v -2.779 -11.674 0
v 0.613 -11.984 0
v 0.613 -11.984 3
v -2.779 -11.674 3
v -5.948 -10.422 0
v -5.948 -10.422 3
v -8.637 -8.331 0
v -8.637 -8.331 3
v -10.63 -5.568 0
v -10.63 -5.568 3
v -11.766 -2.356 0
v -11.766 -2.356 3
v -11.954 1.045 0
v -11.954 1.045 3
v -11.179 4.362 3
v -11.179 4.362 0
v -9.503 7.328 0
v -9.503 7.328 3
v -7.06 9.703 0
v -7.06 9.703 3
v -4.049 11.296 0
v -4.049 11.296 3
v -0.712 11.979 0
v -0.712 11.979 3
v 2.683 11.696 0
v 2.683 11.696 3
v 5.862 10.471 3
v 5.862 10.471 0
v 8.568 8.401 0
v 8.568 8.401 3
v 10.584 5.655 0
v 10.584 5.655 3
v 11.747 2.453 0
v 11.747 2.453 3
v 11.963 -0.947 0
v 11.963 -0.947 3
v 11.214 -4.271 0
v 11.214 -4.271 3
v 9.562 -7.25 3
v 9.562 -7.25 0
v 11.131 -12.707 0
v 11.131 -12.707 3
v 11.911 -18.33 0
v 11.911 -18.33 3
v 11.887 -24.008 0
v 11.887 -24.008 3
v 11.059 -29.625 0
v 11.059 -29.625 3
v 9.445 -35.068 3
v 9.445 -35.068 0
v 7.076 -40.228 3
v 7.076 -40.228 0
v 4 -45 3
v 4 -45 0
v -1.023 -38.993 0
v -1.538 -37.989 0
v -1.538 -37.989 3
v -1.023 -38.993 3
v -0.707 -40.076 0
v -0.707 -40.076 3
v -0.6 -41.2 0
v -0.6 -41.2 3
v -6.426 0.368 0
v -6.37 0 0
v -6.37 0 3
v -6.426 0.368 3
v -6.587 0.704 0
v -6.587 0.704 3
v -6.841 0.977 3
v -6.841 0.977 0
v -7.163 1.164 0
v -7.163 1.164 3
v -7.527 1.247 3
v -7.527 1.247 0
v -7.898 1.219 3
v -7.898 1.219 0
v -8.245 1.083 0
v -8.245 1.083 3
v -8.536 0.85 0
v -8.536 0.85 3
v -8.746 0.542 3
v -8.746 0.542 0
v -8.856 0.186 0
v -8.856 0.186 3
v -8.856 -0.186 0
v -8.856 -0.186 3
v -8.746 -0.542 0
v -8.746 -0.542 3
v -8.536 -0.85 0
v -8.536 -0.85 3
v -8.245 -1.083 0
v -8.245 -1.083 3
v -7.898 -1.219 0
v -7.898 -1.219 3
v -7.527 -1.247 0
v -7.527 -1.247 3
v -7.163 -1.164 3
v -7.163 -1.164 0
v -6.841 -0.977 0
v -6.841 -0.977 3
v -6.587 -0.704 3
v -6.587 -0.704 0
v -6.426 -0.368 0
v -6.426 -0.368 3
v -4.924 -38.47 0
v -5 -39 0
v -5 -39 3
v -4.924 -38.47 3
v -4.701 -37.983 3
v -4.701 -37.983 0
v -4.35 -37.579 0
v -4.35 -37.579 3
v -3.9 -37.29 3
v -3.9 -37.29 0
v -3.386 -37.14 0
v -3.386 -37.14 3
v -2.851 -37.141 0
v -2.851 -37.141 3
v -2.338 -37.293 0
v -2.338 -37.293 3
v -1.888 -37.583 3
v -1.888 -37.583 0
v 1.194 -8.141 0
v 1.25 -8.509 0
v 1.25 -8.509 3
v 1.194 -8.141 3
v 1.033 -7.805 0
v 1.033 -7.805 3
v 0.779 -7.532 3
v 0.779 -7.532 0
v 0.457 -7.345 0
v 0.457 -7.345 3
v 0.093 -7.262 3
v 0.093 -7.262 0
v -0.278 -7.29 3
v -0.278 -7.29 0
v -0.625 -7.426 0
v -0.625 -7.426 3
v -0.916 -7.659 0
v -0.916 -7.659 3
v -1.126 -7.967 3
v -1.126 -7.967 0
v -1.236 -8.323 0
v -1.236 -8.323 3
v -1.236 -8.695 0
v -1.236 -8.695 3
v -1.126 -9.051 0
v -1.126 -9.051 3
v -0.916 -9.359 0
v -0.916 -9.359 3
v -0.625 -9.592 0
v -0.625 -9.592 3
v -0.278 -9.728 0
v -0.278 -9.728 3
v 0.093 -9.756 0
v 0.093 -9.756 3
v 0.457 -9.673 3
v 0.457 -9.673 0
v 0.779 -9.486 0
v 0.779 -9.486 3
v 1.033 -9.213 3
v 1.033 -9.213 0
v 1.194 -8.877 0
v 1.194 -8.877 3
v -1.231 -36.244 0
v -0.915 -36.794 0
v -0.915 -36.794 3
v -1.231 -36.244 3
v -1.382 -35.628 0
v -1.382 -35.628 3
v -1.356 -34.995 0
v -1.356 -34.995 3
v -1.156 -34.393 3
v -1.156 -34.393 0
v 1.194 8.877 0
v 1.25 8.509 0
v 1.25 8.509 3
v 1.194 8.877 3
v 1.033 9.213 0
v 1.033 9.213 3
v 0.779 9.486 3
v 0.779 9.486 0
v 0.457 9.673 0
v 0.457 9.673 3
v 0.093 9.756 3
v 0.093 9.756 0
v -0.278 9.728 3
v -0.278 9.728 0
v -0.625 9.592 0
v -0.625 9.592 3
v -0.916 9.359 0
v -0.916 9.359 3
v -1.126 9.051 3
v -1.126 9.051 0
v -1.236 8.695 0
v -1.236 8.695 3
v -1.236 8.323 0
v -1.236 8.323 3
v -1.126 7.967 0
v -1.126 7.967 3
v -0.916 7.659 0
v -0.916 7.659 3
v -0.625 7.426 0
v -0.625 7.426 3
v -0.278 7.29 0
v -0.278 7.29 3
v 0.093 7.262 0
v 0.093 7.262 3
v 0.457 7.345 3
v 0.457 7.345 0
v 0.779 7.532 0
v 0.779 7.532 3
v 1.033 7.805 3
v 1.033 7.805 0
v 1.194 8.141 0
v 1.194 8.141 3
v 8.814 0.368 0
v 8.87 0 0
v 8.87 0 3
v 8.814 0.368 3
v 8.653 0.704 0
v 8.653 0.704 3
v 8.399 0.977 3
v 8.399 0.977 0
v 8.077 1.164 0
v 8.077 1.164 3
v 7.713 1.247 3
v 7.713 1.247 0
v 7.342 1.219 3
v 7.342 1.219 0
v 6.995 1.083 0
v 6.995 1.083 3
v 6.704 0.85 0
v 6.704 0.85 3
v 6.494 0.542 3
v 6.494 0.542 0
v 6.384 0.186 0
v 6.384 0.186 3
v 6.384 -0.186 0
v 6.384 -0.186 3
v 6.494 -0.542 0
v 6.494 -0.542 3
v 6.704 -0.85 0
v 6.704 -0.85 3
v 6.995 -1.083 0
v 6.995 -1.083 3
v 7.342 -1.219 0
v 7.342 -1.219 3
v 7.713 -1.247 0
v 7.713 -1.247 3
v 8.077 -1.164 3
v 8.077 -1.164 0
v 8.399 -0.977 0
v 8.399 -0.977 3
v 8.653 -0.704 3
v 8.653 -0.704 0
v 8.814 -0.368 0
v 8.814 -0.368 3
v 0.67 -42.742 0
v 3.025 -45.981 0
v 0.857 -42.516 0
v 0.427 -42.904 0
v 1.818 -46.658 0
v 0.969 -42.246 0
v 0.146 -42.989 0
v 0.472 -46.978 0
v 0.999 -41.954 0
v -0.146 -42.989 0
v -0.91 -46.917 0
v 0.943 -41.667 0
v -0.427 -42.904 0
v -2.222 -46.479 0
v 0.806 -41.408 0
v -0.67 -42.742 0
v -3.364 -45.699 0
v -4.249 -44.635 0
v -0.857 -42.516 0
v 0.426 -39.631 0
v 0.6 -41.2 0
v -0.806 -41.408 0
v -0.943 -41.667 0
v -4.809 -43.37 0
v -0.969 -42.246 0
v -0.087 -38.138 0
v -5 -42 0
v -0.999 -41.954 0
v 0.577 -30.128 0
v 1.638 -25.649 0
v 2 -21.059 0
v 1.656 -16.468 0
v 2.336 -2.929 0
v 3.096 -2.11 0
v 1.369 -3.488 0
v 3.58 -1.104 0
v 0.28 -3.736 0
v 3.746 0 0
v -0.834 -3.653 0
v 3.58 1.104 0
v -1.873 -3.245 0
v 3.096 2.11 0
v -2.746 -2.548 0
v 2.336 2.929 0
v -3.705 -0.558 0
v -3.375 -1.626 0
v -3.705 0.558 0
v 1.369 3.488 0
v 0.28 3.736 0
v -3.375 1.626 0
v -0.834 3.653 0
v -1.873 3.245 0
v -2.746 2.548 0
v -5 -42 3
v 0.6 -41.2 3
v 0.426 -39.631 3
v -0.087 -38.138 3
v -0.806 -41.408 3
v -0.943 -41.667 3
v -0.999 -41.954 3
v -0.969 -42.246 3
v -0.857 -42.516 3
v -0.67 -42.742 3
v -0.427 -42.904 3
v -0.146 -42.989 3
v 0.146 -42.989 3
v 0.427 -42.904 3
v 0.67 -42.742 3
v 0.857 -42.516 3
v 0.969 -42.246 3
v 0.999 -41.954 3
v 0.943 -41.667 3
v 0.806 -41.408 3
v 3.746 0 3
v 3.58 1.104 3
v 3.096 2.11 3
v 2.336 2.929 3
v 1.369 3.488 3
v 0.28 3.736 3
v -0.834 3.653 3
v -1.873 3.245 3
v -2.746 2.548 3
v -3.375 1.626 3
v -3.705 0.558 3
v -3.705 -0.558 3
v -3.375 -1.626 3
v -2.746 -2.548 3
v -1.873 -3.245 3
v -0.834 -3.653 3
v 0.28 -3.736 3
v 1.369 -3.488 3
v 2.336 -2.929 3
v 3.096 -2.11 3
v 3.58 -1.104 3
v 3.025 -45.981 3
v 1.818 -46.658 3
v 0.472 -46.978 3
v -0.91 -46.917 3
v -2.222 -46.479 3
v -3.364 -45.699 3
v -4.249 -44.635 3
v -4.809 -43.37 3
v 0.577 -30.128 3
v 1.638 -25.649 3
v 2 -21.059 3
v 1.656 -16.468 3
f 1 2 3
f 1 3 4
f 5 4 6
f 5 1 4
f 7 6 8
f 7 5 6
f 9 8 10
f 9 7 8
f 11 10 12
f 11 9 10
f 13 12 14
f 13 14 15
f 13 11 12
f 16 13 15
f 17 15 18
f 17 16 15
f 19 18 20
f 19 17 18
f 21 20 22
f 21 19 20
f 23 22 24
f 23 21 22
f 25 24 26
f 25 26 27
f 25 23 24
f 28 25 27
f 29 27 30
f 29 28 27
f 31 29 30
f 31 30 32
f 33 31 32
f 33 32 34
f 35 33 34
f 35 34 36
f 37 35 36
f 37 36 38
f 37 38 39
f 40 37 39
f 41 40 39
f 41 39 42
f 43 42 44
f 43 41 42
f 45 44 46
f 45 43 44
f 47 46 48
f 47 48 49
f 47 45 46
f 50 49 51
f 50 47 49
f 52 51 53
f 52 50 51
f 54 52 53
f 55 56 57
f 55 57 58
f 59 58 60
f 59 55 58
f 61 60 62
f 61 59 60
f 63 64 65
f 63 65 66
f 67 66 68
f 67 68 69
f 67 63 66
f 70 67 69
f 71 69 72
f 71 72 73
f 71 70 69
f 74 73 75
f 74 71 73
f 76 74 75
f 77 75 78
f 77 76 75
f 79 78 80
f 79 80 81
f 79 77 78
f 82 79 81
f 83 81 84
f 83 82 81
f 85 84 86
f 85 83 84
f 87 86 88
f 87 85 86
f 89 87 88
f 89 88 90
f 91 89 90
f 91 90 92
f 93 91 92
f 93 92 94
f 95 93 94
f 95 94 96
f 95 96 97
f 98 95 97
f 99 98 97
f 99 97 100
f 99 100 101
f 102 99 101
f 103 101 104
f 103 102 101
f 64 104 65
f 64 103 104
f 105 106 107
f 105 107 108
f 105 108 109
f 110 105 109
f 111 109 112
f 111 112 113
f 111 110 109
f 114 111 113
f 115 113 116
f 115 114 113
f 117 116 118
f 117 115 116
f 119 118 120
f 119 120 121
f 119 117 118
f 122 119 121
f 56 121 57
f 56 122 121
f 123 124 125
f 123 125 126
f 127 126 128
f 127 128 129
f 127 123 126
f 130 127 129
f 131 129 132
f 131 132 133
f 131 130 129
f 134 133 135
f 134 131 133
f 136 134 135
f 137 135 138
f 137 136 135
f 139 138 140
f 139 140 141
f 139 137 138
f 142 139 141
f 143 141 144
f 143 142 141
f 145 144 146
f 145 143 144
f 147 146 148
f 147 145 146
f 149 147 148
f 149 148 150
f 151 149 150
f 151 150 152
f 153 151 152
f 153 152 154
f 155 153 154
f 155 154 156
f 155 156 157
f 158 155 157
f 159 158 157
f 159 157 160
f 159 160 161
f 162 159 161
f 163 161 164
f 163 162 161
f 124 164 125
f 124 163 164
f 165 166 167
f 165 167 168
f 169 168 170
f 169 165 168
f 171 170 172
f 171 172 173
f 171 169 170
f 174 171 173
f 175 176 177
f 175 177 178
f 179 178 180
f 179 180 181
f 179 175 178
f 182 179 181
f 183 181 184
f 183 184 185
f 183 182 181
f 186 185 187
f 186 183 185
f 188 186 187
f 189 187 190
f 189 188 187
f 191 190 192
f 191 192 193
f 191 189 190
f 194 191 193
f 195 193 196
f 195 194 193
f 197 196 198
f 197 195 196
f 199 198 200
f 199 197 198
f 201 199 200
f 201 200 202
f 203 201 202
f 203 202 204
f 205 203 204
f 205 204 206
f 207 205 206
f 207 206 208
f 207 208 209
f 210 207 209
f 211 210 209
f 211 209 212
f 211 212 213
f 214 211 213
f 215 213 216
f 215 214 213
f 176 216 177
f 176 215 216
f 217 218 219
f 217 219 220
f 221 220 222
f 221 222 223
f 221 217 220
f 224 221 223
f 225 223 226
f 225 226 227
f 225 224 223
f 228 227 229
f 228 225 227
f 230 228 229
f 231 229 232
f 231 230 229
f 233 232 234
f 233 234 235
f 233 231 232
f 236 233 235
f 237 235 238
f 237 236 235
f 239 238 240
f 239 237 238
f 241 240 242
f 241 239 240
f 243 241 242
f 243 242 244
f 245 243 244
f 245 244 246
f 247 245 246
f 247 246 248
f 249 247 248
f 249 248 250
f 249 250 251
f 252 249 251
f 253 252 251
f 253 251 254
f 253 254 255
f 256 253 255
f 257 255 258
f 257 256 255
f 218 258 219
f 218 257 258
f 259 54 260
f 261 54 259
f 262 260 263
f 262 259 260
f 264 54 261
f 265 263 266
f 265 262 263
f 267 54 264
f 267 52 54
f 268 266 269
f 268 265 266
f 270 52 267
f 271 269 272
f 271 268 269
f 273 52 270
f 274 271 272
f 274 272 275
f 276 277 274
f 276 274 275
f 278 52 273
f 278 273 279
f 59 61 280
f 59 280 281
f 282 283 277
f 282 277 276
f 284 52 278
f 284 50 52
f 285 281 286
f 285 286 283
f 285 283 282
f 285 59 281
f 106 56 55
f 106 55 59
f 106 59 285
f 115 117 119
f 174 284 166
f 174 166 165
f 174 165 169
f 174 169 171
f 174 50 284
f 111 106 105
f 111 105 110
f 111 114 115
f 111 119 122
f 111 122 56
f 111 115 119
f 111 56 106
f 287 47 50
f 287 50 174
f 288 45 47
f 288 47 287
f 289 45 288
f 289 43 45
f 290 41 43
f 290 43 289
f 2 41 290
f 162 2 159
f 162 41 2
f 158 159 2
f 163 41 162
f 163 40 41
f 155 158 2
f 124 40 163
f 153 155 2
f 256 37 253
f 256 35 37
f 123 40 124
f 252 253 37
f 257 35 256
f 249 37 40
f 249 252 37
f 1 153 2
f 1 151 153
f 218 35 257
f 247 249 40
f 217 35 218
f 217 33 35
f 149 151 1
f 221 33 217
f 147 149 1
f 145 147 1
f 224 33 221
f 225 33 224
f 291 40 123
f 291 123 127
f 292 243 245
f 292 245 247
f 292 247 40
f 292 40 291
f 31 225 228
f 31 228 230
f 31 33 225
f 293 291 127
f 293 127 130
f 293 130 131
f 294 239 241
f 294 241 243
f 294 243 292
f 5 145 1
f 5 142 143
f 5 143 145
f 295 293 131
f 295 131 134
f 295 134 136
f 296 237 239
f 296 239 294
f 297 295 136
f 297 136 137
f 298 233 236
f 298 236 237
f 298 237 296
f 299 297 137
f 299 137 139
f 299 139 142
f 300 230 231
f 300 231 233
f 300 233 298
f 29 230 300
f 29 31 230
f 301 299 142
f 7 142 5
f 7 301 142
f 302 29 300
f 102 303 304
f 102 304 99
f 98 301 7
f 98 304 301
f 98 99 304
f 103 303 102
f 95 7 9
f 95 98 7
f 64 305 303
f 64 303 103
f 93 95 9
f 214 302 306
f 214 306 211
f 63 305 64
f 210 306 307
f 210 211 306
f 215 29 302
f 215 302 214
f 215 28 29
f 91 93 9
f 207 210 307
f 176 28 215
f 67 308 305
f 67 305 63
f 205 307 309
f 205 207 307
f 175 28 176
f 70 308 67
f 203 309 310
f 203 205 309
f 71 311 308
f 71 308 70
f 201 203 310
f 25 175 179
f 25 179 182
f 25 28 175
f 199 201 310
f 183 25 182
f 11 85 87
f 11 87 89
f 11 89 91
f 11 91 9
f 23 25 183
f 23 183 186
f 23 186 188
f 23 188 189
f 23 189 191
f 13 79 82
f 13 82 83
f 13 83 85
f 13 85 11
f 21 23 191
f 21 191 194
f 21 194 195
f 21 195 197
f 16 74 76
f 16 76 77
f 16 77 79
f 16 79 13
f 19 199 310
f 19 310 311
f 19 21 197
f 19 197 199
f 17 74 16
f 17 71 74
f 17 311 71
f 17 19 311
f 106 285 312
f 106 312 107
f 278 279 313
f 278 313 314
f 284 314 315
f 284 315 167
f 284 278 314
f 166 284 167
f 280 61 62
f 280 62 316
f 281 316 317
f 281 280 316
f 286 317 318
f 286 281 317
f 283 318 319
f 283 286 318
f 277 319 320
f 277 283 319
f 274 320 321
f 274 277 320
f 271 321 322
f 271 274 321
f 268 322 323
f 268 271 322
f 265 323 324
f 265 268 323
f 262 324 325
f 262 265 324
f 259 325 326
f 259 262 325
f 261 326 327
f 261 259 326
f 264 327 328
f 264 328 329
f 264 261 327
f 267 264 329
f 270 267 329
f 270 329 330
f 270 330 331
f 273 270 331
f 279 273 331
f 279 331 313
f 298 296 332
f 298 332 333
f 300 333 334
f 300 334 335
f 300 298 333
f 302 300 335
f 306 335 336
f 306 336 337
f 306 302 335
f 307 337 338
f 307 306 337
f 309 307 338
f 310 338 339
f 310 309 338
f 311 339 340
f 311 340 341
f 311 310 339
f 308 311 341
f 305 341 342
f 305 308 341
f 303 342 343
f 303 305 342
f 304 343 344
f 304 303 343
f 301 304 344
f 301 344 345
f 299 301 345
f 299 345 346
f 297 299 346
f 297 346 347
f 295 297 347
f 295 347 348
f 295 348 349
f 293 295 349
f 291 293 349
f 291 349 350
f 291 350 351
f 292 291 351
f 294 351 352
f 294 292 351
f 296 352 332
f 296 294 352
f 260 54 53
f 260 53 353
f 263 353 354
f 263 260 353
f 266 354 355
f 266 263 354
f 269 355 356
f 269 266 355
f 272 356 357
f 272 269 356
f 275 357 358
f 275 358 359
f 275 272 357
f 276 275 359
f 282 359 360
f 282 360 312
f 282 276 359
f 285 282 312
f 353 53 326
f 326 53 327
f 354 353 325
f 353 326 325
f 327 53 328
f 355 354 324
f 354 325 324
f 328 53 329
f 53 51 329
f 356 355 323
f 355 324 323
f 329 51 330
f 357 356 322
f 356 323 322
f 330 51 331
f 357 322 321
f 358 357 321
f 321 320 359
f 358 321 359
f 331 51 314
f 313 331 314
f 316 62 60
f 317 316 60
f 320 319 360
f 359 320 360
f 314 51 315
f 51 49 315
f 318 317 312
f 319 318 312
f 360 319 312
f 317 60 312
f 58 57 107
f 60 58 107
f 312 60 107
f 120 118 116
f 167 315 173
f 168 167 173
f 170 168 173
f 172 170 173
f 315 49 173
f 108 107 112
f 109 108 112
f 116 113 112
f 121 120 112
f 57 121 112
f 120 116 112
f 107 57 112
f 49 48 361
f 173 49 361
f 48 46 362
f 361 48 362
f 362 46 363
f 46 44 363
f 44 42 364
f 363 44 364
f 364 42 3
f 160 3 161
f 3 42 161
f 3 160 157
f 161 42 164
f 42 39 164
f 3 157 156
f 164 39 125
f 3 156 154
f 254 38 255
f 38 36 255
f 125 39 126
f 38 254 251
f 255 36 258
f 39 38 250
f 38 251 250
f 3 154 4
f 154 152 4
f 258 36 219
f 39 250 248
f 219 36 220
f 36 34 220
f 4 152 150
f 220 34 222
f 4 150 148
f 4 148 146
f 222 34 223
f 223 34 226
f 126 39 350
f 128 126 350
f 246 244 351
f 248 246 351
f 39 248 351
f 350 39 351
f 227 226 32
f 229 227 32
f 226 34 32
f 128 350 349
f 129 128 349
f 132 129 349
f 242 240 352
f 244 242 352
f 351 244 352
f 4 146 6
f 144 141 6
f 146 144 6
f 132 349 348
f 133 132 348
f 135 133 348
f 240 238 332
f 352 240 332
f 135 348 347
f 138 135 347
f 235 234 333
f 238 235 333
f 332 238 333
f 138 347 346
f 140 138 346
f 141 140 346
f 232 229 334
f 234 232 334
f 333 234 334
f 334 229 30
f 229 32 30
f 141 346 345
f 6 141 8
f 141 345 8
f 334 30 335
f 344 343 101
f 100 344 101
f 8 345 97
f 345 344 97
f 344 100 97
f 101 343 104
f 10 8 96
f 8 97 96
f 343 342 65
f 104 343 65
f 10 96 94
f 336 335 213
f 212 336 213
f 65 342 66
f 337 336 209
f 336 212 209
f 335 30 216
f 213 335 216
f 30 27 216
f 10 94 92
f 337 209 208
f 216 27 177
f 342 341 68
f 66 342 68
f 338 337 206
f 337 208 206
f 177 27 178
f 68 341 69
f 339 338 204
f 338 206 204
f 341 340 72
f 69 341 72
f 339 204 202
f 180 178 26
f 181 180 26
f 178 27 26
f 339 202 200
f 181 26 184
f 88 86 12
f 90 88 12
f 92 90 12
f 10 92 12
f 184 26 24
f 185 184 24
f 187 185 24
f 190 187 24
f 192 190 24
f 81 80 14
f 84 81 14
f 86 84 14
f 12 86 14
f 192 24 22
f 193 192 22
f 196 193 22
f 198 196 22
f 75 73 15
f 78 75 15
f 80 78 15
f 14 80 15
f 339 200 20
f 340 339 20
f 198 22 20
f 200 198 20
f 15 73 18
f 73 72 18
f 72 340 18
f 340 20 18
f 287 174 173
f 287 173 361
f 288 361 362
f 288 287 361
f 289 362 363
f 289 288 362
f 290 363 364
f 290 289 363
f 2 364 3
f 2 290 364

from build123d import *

# Parameters (mm, degrees)
SKETCH1_R           = 3.7465
SKETCH1_R_2         = 1.25
BOSS_EXTRUDE1_DEPTH = 3


with BuildPart() as part:
    # Sketch1 → Boss-Extrude1 (new body)
    with BuildSketch(Plane.XY):
        with BuildLine():
            Line((-5, -42), (-5, -39))
            ThreePointArc((-5, -39), (-3.64832327, -37.196831118), (-1.538417978, -37.988505079))
            ThreePointArc((-1.538417978, -37.988505079), (-0.839409352, -39.527103714), (-0.6, -41.2))
            ThreePointArc((-0.6, -41.2), (0, -43), (0.6, -41.2))
            ThreePointArc((0.6, -41.2), (0.210597624, -38.870174368), (-0.915279992, -36.793609589))
            ThreePointArc((-0.915279992, -36.793609589), (-1.38227286, -35.62821691), (-1.15567211, -34.393358808))
            ThreePointArc((-1.15567211, -34.393358808), (1.906967722, -23.36077989), (0.613240327, -11.984320436))
            ThreePointArc((0.613240327, -11.984320436), (-5.611566101, 10.607088474), (9.562398428, -7.249864571))
            ThreePointArc((9.562398428, -7.249864571), (11.572717875, -26.830951895), (4, -45))
            ThreePointArc((4, -45), (-1.58113883, -46.74341649), (-5, -42))
        make_face()
        Circle(SKETCH1_R, mode=Mode.SUBTRACT)
        with Locations((0, 8.509)):
            Circle(SKETCH1_R_2, mode=Mode.SUBTRACT)
        with Locations((-7.62, 0)):
            Circle(SKETCH1_R_2, mode=Mode.SUBTRACT)
        with Locations((0, -8.509)):
            Circle(SKETCH1_R_2, mode=Mode.SUBTRACT)
        with Locations((7.62, 0)):
            Circle(SKETCH1_R_2, mode=Mode.SUBTRACT)
    extrude(amount=BOSS_EXTRUDE1_DEPTH)


solid = part.part
